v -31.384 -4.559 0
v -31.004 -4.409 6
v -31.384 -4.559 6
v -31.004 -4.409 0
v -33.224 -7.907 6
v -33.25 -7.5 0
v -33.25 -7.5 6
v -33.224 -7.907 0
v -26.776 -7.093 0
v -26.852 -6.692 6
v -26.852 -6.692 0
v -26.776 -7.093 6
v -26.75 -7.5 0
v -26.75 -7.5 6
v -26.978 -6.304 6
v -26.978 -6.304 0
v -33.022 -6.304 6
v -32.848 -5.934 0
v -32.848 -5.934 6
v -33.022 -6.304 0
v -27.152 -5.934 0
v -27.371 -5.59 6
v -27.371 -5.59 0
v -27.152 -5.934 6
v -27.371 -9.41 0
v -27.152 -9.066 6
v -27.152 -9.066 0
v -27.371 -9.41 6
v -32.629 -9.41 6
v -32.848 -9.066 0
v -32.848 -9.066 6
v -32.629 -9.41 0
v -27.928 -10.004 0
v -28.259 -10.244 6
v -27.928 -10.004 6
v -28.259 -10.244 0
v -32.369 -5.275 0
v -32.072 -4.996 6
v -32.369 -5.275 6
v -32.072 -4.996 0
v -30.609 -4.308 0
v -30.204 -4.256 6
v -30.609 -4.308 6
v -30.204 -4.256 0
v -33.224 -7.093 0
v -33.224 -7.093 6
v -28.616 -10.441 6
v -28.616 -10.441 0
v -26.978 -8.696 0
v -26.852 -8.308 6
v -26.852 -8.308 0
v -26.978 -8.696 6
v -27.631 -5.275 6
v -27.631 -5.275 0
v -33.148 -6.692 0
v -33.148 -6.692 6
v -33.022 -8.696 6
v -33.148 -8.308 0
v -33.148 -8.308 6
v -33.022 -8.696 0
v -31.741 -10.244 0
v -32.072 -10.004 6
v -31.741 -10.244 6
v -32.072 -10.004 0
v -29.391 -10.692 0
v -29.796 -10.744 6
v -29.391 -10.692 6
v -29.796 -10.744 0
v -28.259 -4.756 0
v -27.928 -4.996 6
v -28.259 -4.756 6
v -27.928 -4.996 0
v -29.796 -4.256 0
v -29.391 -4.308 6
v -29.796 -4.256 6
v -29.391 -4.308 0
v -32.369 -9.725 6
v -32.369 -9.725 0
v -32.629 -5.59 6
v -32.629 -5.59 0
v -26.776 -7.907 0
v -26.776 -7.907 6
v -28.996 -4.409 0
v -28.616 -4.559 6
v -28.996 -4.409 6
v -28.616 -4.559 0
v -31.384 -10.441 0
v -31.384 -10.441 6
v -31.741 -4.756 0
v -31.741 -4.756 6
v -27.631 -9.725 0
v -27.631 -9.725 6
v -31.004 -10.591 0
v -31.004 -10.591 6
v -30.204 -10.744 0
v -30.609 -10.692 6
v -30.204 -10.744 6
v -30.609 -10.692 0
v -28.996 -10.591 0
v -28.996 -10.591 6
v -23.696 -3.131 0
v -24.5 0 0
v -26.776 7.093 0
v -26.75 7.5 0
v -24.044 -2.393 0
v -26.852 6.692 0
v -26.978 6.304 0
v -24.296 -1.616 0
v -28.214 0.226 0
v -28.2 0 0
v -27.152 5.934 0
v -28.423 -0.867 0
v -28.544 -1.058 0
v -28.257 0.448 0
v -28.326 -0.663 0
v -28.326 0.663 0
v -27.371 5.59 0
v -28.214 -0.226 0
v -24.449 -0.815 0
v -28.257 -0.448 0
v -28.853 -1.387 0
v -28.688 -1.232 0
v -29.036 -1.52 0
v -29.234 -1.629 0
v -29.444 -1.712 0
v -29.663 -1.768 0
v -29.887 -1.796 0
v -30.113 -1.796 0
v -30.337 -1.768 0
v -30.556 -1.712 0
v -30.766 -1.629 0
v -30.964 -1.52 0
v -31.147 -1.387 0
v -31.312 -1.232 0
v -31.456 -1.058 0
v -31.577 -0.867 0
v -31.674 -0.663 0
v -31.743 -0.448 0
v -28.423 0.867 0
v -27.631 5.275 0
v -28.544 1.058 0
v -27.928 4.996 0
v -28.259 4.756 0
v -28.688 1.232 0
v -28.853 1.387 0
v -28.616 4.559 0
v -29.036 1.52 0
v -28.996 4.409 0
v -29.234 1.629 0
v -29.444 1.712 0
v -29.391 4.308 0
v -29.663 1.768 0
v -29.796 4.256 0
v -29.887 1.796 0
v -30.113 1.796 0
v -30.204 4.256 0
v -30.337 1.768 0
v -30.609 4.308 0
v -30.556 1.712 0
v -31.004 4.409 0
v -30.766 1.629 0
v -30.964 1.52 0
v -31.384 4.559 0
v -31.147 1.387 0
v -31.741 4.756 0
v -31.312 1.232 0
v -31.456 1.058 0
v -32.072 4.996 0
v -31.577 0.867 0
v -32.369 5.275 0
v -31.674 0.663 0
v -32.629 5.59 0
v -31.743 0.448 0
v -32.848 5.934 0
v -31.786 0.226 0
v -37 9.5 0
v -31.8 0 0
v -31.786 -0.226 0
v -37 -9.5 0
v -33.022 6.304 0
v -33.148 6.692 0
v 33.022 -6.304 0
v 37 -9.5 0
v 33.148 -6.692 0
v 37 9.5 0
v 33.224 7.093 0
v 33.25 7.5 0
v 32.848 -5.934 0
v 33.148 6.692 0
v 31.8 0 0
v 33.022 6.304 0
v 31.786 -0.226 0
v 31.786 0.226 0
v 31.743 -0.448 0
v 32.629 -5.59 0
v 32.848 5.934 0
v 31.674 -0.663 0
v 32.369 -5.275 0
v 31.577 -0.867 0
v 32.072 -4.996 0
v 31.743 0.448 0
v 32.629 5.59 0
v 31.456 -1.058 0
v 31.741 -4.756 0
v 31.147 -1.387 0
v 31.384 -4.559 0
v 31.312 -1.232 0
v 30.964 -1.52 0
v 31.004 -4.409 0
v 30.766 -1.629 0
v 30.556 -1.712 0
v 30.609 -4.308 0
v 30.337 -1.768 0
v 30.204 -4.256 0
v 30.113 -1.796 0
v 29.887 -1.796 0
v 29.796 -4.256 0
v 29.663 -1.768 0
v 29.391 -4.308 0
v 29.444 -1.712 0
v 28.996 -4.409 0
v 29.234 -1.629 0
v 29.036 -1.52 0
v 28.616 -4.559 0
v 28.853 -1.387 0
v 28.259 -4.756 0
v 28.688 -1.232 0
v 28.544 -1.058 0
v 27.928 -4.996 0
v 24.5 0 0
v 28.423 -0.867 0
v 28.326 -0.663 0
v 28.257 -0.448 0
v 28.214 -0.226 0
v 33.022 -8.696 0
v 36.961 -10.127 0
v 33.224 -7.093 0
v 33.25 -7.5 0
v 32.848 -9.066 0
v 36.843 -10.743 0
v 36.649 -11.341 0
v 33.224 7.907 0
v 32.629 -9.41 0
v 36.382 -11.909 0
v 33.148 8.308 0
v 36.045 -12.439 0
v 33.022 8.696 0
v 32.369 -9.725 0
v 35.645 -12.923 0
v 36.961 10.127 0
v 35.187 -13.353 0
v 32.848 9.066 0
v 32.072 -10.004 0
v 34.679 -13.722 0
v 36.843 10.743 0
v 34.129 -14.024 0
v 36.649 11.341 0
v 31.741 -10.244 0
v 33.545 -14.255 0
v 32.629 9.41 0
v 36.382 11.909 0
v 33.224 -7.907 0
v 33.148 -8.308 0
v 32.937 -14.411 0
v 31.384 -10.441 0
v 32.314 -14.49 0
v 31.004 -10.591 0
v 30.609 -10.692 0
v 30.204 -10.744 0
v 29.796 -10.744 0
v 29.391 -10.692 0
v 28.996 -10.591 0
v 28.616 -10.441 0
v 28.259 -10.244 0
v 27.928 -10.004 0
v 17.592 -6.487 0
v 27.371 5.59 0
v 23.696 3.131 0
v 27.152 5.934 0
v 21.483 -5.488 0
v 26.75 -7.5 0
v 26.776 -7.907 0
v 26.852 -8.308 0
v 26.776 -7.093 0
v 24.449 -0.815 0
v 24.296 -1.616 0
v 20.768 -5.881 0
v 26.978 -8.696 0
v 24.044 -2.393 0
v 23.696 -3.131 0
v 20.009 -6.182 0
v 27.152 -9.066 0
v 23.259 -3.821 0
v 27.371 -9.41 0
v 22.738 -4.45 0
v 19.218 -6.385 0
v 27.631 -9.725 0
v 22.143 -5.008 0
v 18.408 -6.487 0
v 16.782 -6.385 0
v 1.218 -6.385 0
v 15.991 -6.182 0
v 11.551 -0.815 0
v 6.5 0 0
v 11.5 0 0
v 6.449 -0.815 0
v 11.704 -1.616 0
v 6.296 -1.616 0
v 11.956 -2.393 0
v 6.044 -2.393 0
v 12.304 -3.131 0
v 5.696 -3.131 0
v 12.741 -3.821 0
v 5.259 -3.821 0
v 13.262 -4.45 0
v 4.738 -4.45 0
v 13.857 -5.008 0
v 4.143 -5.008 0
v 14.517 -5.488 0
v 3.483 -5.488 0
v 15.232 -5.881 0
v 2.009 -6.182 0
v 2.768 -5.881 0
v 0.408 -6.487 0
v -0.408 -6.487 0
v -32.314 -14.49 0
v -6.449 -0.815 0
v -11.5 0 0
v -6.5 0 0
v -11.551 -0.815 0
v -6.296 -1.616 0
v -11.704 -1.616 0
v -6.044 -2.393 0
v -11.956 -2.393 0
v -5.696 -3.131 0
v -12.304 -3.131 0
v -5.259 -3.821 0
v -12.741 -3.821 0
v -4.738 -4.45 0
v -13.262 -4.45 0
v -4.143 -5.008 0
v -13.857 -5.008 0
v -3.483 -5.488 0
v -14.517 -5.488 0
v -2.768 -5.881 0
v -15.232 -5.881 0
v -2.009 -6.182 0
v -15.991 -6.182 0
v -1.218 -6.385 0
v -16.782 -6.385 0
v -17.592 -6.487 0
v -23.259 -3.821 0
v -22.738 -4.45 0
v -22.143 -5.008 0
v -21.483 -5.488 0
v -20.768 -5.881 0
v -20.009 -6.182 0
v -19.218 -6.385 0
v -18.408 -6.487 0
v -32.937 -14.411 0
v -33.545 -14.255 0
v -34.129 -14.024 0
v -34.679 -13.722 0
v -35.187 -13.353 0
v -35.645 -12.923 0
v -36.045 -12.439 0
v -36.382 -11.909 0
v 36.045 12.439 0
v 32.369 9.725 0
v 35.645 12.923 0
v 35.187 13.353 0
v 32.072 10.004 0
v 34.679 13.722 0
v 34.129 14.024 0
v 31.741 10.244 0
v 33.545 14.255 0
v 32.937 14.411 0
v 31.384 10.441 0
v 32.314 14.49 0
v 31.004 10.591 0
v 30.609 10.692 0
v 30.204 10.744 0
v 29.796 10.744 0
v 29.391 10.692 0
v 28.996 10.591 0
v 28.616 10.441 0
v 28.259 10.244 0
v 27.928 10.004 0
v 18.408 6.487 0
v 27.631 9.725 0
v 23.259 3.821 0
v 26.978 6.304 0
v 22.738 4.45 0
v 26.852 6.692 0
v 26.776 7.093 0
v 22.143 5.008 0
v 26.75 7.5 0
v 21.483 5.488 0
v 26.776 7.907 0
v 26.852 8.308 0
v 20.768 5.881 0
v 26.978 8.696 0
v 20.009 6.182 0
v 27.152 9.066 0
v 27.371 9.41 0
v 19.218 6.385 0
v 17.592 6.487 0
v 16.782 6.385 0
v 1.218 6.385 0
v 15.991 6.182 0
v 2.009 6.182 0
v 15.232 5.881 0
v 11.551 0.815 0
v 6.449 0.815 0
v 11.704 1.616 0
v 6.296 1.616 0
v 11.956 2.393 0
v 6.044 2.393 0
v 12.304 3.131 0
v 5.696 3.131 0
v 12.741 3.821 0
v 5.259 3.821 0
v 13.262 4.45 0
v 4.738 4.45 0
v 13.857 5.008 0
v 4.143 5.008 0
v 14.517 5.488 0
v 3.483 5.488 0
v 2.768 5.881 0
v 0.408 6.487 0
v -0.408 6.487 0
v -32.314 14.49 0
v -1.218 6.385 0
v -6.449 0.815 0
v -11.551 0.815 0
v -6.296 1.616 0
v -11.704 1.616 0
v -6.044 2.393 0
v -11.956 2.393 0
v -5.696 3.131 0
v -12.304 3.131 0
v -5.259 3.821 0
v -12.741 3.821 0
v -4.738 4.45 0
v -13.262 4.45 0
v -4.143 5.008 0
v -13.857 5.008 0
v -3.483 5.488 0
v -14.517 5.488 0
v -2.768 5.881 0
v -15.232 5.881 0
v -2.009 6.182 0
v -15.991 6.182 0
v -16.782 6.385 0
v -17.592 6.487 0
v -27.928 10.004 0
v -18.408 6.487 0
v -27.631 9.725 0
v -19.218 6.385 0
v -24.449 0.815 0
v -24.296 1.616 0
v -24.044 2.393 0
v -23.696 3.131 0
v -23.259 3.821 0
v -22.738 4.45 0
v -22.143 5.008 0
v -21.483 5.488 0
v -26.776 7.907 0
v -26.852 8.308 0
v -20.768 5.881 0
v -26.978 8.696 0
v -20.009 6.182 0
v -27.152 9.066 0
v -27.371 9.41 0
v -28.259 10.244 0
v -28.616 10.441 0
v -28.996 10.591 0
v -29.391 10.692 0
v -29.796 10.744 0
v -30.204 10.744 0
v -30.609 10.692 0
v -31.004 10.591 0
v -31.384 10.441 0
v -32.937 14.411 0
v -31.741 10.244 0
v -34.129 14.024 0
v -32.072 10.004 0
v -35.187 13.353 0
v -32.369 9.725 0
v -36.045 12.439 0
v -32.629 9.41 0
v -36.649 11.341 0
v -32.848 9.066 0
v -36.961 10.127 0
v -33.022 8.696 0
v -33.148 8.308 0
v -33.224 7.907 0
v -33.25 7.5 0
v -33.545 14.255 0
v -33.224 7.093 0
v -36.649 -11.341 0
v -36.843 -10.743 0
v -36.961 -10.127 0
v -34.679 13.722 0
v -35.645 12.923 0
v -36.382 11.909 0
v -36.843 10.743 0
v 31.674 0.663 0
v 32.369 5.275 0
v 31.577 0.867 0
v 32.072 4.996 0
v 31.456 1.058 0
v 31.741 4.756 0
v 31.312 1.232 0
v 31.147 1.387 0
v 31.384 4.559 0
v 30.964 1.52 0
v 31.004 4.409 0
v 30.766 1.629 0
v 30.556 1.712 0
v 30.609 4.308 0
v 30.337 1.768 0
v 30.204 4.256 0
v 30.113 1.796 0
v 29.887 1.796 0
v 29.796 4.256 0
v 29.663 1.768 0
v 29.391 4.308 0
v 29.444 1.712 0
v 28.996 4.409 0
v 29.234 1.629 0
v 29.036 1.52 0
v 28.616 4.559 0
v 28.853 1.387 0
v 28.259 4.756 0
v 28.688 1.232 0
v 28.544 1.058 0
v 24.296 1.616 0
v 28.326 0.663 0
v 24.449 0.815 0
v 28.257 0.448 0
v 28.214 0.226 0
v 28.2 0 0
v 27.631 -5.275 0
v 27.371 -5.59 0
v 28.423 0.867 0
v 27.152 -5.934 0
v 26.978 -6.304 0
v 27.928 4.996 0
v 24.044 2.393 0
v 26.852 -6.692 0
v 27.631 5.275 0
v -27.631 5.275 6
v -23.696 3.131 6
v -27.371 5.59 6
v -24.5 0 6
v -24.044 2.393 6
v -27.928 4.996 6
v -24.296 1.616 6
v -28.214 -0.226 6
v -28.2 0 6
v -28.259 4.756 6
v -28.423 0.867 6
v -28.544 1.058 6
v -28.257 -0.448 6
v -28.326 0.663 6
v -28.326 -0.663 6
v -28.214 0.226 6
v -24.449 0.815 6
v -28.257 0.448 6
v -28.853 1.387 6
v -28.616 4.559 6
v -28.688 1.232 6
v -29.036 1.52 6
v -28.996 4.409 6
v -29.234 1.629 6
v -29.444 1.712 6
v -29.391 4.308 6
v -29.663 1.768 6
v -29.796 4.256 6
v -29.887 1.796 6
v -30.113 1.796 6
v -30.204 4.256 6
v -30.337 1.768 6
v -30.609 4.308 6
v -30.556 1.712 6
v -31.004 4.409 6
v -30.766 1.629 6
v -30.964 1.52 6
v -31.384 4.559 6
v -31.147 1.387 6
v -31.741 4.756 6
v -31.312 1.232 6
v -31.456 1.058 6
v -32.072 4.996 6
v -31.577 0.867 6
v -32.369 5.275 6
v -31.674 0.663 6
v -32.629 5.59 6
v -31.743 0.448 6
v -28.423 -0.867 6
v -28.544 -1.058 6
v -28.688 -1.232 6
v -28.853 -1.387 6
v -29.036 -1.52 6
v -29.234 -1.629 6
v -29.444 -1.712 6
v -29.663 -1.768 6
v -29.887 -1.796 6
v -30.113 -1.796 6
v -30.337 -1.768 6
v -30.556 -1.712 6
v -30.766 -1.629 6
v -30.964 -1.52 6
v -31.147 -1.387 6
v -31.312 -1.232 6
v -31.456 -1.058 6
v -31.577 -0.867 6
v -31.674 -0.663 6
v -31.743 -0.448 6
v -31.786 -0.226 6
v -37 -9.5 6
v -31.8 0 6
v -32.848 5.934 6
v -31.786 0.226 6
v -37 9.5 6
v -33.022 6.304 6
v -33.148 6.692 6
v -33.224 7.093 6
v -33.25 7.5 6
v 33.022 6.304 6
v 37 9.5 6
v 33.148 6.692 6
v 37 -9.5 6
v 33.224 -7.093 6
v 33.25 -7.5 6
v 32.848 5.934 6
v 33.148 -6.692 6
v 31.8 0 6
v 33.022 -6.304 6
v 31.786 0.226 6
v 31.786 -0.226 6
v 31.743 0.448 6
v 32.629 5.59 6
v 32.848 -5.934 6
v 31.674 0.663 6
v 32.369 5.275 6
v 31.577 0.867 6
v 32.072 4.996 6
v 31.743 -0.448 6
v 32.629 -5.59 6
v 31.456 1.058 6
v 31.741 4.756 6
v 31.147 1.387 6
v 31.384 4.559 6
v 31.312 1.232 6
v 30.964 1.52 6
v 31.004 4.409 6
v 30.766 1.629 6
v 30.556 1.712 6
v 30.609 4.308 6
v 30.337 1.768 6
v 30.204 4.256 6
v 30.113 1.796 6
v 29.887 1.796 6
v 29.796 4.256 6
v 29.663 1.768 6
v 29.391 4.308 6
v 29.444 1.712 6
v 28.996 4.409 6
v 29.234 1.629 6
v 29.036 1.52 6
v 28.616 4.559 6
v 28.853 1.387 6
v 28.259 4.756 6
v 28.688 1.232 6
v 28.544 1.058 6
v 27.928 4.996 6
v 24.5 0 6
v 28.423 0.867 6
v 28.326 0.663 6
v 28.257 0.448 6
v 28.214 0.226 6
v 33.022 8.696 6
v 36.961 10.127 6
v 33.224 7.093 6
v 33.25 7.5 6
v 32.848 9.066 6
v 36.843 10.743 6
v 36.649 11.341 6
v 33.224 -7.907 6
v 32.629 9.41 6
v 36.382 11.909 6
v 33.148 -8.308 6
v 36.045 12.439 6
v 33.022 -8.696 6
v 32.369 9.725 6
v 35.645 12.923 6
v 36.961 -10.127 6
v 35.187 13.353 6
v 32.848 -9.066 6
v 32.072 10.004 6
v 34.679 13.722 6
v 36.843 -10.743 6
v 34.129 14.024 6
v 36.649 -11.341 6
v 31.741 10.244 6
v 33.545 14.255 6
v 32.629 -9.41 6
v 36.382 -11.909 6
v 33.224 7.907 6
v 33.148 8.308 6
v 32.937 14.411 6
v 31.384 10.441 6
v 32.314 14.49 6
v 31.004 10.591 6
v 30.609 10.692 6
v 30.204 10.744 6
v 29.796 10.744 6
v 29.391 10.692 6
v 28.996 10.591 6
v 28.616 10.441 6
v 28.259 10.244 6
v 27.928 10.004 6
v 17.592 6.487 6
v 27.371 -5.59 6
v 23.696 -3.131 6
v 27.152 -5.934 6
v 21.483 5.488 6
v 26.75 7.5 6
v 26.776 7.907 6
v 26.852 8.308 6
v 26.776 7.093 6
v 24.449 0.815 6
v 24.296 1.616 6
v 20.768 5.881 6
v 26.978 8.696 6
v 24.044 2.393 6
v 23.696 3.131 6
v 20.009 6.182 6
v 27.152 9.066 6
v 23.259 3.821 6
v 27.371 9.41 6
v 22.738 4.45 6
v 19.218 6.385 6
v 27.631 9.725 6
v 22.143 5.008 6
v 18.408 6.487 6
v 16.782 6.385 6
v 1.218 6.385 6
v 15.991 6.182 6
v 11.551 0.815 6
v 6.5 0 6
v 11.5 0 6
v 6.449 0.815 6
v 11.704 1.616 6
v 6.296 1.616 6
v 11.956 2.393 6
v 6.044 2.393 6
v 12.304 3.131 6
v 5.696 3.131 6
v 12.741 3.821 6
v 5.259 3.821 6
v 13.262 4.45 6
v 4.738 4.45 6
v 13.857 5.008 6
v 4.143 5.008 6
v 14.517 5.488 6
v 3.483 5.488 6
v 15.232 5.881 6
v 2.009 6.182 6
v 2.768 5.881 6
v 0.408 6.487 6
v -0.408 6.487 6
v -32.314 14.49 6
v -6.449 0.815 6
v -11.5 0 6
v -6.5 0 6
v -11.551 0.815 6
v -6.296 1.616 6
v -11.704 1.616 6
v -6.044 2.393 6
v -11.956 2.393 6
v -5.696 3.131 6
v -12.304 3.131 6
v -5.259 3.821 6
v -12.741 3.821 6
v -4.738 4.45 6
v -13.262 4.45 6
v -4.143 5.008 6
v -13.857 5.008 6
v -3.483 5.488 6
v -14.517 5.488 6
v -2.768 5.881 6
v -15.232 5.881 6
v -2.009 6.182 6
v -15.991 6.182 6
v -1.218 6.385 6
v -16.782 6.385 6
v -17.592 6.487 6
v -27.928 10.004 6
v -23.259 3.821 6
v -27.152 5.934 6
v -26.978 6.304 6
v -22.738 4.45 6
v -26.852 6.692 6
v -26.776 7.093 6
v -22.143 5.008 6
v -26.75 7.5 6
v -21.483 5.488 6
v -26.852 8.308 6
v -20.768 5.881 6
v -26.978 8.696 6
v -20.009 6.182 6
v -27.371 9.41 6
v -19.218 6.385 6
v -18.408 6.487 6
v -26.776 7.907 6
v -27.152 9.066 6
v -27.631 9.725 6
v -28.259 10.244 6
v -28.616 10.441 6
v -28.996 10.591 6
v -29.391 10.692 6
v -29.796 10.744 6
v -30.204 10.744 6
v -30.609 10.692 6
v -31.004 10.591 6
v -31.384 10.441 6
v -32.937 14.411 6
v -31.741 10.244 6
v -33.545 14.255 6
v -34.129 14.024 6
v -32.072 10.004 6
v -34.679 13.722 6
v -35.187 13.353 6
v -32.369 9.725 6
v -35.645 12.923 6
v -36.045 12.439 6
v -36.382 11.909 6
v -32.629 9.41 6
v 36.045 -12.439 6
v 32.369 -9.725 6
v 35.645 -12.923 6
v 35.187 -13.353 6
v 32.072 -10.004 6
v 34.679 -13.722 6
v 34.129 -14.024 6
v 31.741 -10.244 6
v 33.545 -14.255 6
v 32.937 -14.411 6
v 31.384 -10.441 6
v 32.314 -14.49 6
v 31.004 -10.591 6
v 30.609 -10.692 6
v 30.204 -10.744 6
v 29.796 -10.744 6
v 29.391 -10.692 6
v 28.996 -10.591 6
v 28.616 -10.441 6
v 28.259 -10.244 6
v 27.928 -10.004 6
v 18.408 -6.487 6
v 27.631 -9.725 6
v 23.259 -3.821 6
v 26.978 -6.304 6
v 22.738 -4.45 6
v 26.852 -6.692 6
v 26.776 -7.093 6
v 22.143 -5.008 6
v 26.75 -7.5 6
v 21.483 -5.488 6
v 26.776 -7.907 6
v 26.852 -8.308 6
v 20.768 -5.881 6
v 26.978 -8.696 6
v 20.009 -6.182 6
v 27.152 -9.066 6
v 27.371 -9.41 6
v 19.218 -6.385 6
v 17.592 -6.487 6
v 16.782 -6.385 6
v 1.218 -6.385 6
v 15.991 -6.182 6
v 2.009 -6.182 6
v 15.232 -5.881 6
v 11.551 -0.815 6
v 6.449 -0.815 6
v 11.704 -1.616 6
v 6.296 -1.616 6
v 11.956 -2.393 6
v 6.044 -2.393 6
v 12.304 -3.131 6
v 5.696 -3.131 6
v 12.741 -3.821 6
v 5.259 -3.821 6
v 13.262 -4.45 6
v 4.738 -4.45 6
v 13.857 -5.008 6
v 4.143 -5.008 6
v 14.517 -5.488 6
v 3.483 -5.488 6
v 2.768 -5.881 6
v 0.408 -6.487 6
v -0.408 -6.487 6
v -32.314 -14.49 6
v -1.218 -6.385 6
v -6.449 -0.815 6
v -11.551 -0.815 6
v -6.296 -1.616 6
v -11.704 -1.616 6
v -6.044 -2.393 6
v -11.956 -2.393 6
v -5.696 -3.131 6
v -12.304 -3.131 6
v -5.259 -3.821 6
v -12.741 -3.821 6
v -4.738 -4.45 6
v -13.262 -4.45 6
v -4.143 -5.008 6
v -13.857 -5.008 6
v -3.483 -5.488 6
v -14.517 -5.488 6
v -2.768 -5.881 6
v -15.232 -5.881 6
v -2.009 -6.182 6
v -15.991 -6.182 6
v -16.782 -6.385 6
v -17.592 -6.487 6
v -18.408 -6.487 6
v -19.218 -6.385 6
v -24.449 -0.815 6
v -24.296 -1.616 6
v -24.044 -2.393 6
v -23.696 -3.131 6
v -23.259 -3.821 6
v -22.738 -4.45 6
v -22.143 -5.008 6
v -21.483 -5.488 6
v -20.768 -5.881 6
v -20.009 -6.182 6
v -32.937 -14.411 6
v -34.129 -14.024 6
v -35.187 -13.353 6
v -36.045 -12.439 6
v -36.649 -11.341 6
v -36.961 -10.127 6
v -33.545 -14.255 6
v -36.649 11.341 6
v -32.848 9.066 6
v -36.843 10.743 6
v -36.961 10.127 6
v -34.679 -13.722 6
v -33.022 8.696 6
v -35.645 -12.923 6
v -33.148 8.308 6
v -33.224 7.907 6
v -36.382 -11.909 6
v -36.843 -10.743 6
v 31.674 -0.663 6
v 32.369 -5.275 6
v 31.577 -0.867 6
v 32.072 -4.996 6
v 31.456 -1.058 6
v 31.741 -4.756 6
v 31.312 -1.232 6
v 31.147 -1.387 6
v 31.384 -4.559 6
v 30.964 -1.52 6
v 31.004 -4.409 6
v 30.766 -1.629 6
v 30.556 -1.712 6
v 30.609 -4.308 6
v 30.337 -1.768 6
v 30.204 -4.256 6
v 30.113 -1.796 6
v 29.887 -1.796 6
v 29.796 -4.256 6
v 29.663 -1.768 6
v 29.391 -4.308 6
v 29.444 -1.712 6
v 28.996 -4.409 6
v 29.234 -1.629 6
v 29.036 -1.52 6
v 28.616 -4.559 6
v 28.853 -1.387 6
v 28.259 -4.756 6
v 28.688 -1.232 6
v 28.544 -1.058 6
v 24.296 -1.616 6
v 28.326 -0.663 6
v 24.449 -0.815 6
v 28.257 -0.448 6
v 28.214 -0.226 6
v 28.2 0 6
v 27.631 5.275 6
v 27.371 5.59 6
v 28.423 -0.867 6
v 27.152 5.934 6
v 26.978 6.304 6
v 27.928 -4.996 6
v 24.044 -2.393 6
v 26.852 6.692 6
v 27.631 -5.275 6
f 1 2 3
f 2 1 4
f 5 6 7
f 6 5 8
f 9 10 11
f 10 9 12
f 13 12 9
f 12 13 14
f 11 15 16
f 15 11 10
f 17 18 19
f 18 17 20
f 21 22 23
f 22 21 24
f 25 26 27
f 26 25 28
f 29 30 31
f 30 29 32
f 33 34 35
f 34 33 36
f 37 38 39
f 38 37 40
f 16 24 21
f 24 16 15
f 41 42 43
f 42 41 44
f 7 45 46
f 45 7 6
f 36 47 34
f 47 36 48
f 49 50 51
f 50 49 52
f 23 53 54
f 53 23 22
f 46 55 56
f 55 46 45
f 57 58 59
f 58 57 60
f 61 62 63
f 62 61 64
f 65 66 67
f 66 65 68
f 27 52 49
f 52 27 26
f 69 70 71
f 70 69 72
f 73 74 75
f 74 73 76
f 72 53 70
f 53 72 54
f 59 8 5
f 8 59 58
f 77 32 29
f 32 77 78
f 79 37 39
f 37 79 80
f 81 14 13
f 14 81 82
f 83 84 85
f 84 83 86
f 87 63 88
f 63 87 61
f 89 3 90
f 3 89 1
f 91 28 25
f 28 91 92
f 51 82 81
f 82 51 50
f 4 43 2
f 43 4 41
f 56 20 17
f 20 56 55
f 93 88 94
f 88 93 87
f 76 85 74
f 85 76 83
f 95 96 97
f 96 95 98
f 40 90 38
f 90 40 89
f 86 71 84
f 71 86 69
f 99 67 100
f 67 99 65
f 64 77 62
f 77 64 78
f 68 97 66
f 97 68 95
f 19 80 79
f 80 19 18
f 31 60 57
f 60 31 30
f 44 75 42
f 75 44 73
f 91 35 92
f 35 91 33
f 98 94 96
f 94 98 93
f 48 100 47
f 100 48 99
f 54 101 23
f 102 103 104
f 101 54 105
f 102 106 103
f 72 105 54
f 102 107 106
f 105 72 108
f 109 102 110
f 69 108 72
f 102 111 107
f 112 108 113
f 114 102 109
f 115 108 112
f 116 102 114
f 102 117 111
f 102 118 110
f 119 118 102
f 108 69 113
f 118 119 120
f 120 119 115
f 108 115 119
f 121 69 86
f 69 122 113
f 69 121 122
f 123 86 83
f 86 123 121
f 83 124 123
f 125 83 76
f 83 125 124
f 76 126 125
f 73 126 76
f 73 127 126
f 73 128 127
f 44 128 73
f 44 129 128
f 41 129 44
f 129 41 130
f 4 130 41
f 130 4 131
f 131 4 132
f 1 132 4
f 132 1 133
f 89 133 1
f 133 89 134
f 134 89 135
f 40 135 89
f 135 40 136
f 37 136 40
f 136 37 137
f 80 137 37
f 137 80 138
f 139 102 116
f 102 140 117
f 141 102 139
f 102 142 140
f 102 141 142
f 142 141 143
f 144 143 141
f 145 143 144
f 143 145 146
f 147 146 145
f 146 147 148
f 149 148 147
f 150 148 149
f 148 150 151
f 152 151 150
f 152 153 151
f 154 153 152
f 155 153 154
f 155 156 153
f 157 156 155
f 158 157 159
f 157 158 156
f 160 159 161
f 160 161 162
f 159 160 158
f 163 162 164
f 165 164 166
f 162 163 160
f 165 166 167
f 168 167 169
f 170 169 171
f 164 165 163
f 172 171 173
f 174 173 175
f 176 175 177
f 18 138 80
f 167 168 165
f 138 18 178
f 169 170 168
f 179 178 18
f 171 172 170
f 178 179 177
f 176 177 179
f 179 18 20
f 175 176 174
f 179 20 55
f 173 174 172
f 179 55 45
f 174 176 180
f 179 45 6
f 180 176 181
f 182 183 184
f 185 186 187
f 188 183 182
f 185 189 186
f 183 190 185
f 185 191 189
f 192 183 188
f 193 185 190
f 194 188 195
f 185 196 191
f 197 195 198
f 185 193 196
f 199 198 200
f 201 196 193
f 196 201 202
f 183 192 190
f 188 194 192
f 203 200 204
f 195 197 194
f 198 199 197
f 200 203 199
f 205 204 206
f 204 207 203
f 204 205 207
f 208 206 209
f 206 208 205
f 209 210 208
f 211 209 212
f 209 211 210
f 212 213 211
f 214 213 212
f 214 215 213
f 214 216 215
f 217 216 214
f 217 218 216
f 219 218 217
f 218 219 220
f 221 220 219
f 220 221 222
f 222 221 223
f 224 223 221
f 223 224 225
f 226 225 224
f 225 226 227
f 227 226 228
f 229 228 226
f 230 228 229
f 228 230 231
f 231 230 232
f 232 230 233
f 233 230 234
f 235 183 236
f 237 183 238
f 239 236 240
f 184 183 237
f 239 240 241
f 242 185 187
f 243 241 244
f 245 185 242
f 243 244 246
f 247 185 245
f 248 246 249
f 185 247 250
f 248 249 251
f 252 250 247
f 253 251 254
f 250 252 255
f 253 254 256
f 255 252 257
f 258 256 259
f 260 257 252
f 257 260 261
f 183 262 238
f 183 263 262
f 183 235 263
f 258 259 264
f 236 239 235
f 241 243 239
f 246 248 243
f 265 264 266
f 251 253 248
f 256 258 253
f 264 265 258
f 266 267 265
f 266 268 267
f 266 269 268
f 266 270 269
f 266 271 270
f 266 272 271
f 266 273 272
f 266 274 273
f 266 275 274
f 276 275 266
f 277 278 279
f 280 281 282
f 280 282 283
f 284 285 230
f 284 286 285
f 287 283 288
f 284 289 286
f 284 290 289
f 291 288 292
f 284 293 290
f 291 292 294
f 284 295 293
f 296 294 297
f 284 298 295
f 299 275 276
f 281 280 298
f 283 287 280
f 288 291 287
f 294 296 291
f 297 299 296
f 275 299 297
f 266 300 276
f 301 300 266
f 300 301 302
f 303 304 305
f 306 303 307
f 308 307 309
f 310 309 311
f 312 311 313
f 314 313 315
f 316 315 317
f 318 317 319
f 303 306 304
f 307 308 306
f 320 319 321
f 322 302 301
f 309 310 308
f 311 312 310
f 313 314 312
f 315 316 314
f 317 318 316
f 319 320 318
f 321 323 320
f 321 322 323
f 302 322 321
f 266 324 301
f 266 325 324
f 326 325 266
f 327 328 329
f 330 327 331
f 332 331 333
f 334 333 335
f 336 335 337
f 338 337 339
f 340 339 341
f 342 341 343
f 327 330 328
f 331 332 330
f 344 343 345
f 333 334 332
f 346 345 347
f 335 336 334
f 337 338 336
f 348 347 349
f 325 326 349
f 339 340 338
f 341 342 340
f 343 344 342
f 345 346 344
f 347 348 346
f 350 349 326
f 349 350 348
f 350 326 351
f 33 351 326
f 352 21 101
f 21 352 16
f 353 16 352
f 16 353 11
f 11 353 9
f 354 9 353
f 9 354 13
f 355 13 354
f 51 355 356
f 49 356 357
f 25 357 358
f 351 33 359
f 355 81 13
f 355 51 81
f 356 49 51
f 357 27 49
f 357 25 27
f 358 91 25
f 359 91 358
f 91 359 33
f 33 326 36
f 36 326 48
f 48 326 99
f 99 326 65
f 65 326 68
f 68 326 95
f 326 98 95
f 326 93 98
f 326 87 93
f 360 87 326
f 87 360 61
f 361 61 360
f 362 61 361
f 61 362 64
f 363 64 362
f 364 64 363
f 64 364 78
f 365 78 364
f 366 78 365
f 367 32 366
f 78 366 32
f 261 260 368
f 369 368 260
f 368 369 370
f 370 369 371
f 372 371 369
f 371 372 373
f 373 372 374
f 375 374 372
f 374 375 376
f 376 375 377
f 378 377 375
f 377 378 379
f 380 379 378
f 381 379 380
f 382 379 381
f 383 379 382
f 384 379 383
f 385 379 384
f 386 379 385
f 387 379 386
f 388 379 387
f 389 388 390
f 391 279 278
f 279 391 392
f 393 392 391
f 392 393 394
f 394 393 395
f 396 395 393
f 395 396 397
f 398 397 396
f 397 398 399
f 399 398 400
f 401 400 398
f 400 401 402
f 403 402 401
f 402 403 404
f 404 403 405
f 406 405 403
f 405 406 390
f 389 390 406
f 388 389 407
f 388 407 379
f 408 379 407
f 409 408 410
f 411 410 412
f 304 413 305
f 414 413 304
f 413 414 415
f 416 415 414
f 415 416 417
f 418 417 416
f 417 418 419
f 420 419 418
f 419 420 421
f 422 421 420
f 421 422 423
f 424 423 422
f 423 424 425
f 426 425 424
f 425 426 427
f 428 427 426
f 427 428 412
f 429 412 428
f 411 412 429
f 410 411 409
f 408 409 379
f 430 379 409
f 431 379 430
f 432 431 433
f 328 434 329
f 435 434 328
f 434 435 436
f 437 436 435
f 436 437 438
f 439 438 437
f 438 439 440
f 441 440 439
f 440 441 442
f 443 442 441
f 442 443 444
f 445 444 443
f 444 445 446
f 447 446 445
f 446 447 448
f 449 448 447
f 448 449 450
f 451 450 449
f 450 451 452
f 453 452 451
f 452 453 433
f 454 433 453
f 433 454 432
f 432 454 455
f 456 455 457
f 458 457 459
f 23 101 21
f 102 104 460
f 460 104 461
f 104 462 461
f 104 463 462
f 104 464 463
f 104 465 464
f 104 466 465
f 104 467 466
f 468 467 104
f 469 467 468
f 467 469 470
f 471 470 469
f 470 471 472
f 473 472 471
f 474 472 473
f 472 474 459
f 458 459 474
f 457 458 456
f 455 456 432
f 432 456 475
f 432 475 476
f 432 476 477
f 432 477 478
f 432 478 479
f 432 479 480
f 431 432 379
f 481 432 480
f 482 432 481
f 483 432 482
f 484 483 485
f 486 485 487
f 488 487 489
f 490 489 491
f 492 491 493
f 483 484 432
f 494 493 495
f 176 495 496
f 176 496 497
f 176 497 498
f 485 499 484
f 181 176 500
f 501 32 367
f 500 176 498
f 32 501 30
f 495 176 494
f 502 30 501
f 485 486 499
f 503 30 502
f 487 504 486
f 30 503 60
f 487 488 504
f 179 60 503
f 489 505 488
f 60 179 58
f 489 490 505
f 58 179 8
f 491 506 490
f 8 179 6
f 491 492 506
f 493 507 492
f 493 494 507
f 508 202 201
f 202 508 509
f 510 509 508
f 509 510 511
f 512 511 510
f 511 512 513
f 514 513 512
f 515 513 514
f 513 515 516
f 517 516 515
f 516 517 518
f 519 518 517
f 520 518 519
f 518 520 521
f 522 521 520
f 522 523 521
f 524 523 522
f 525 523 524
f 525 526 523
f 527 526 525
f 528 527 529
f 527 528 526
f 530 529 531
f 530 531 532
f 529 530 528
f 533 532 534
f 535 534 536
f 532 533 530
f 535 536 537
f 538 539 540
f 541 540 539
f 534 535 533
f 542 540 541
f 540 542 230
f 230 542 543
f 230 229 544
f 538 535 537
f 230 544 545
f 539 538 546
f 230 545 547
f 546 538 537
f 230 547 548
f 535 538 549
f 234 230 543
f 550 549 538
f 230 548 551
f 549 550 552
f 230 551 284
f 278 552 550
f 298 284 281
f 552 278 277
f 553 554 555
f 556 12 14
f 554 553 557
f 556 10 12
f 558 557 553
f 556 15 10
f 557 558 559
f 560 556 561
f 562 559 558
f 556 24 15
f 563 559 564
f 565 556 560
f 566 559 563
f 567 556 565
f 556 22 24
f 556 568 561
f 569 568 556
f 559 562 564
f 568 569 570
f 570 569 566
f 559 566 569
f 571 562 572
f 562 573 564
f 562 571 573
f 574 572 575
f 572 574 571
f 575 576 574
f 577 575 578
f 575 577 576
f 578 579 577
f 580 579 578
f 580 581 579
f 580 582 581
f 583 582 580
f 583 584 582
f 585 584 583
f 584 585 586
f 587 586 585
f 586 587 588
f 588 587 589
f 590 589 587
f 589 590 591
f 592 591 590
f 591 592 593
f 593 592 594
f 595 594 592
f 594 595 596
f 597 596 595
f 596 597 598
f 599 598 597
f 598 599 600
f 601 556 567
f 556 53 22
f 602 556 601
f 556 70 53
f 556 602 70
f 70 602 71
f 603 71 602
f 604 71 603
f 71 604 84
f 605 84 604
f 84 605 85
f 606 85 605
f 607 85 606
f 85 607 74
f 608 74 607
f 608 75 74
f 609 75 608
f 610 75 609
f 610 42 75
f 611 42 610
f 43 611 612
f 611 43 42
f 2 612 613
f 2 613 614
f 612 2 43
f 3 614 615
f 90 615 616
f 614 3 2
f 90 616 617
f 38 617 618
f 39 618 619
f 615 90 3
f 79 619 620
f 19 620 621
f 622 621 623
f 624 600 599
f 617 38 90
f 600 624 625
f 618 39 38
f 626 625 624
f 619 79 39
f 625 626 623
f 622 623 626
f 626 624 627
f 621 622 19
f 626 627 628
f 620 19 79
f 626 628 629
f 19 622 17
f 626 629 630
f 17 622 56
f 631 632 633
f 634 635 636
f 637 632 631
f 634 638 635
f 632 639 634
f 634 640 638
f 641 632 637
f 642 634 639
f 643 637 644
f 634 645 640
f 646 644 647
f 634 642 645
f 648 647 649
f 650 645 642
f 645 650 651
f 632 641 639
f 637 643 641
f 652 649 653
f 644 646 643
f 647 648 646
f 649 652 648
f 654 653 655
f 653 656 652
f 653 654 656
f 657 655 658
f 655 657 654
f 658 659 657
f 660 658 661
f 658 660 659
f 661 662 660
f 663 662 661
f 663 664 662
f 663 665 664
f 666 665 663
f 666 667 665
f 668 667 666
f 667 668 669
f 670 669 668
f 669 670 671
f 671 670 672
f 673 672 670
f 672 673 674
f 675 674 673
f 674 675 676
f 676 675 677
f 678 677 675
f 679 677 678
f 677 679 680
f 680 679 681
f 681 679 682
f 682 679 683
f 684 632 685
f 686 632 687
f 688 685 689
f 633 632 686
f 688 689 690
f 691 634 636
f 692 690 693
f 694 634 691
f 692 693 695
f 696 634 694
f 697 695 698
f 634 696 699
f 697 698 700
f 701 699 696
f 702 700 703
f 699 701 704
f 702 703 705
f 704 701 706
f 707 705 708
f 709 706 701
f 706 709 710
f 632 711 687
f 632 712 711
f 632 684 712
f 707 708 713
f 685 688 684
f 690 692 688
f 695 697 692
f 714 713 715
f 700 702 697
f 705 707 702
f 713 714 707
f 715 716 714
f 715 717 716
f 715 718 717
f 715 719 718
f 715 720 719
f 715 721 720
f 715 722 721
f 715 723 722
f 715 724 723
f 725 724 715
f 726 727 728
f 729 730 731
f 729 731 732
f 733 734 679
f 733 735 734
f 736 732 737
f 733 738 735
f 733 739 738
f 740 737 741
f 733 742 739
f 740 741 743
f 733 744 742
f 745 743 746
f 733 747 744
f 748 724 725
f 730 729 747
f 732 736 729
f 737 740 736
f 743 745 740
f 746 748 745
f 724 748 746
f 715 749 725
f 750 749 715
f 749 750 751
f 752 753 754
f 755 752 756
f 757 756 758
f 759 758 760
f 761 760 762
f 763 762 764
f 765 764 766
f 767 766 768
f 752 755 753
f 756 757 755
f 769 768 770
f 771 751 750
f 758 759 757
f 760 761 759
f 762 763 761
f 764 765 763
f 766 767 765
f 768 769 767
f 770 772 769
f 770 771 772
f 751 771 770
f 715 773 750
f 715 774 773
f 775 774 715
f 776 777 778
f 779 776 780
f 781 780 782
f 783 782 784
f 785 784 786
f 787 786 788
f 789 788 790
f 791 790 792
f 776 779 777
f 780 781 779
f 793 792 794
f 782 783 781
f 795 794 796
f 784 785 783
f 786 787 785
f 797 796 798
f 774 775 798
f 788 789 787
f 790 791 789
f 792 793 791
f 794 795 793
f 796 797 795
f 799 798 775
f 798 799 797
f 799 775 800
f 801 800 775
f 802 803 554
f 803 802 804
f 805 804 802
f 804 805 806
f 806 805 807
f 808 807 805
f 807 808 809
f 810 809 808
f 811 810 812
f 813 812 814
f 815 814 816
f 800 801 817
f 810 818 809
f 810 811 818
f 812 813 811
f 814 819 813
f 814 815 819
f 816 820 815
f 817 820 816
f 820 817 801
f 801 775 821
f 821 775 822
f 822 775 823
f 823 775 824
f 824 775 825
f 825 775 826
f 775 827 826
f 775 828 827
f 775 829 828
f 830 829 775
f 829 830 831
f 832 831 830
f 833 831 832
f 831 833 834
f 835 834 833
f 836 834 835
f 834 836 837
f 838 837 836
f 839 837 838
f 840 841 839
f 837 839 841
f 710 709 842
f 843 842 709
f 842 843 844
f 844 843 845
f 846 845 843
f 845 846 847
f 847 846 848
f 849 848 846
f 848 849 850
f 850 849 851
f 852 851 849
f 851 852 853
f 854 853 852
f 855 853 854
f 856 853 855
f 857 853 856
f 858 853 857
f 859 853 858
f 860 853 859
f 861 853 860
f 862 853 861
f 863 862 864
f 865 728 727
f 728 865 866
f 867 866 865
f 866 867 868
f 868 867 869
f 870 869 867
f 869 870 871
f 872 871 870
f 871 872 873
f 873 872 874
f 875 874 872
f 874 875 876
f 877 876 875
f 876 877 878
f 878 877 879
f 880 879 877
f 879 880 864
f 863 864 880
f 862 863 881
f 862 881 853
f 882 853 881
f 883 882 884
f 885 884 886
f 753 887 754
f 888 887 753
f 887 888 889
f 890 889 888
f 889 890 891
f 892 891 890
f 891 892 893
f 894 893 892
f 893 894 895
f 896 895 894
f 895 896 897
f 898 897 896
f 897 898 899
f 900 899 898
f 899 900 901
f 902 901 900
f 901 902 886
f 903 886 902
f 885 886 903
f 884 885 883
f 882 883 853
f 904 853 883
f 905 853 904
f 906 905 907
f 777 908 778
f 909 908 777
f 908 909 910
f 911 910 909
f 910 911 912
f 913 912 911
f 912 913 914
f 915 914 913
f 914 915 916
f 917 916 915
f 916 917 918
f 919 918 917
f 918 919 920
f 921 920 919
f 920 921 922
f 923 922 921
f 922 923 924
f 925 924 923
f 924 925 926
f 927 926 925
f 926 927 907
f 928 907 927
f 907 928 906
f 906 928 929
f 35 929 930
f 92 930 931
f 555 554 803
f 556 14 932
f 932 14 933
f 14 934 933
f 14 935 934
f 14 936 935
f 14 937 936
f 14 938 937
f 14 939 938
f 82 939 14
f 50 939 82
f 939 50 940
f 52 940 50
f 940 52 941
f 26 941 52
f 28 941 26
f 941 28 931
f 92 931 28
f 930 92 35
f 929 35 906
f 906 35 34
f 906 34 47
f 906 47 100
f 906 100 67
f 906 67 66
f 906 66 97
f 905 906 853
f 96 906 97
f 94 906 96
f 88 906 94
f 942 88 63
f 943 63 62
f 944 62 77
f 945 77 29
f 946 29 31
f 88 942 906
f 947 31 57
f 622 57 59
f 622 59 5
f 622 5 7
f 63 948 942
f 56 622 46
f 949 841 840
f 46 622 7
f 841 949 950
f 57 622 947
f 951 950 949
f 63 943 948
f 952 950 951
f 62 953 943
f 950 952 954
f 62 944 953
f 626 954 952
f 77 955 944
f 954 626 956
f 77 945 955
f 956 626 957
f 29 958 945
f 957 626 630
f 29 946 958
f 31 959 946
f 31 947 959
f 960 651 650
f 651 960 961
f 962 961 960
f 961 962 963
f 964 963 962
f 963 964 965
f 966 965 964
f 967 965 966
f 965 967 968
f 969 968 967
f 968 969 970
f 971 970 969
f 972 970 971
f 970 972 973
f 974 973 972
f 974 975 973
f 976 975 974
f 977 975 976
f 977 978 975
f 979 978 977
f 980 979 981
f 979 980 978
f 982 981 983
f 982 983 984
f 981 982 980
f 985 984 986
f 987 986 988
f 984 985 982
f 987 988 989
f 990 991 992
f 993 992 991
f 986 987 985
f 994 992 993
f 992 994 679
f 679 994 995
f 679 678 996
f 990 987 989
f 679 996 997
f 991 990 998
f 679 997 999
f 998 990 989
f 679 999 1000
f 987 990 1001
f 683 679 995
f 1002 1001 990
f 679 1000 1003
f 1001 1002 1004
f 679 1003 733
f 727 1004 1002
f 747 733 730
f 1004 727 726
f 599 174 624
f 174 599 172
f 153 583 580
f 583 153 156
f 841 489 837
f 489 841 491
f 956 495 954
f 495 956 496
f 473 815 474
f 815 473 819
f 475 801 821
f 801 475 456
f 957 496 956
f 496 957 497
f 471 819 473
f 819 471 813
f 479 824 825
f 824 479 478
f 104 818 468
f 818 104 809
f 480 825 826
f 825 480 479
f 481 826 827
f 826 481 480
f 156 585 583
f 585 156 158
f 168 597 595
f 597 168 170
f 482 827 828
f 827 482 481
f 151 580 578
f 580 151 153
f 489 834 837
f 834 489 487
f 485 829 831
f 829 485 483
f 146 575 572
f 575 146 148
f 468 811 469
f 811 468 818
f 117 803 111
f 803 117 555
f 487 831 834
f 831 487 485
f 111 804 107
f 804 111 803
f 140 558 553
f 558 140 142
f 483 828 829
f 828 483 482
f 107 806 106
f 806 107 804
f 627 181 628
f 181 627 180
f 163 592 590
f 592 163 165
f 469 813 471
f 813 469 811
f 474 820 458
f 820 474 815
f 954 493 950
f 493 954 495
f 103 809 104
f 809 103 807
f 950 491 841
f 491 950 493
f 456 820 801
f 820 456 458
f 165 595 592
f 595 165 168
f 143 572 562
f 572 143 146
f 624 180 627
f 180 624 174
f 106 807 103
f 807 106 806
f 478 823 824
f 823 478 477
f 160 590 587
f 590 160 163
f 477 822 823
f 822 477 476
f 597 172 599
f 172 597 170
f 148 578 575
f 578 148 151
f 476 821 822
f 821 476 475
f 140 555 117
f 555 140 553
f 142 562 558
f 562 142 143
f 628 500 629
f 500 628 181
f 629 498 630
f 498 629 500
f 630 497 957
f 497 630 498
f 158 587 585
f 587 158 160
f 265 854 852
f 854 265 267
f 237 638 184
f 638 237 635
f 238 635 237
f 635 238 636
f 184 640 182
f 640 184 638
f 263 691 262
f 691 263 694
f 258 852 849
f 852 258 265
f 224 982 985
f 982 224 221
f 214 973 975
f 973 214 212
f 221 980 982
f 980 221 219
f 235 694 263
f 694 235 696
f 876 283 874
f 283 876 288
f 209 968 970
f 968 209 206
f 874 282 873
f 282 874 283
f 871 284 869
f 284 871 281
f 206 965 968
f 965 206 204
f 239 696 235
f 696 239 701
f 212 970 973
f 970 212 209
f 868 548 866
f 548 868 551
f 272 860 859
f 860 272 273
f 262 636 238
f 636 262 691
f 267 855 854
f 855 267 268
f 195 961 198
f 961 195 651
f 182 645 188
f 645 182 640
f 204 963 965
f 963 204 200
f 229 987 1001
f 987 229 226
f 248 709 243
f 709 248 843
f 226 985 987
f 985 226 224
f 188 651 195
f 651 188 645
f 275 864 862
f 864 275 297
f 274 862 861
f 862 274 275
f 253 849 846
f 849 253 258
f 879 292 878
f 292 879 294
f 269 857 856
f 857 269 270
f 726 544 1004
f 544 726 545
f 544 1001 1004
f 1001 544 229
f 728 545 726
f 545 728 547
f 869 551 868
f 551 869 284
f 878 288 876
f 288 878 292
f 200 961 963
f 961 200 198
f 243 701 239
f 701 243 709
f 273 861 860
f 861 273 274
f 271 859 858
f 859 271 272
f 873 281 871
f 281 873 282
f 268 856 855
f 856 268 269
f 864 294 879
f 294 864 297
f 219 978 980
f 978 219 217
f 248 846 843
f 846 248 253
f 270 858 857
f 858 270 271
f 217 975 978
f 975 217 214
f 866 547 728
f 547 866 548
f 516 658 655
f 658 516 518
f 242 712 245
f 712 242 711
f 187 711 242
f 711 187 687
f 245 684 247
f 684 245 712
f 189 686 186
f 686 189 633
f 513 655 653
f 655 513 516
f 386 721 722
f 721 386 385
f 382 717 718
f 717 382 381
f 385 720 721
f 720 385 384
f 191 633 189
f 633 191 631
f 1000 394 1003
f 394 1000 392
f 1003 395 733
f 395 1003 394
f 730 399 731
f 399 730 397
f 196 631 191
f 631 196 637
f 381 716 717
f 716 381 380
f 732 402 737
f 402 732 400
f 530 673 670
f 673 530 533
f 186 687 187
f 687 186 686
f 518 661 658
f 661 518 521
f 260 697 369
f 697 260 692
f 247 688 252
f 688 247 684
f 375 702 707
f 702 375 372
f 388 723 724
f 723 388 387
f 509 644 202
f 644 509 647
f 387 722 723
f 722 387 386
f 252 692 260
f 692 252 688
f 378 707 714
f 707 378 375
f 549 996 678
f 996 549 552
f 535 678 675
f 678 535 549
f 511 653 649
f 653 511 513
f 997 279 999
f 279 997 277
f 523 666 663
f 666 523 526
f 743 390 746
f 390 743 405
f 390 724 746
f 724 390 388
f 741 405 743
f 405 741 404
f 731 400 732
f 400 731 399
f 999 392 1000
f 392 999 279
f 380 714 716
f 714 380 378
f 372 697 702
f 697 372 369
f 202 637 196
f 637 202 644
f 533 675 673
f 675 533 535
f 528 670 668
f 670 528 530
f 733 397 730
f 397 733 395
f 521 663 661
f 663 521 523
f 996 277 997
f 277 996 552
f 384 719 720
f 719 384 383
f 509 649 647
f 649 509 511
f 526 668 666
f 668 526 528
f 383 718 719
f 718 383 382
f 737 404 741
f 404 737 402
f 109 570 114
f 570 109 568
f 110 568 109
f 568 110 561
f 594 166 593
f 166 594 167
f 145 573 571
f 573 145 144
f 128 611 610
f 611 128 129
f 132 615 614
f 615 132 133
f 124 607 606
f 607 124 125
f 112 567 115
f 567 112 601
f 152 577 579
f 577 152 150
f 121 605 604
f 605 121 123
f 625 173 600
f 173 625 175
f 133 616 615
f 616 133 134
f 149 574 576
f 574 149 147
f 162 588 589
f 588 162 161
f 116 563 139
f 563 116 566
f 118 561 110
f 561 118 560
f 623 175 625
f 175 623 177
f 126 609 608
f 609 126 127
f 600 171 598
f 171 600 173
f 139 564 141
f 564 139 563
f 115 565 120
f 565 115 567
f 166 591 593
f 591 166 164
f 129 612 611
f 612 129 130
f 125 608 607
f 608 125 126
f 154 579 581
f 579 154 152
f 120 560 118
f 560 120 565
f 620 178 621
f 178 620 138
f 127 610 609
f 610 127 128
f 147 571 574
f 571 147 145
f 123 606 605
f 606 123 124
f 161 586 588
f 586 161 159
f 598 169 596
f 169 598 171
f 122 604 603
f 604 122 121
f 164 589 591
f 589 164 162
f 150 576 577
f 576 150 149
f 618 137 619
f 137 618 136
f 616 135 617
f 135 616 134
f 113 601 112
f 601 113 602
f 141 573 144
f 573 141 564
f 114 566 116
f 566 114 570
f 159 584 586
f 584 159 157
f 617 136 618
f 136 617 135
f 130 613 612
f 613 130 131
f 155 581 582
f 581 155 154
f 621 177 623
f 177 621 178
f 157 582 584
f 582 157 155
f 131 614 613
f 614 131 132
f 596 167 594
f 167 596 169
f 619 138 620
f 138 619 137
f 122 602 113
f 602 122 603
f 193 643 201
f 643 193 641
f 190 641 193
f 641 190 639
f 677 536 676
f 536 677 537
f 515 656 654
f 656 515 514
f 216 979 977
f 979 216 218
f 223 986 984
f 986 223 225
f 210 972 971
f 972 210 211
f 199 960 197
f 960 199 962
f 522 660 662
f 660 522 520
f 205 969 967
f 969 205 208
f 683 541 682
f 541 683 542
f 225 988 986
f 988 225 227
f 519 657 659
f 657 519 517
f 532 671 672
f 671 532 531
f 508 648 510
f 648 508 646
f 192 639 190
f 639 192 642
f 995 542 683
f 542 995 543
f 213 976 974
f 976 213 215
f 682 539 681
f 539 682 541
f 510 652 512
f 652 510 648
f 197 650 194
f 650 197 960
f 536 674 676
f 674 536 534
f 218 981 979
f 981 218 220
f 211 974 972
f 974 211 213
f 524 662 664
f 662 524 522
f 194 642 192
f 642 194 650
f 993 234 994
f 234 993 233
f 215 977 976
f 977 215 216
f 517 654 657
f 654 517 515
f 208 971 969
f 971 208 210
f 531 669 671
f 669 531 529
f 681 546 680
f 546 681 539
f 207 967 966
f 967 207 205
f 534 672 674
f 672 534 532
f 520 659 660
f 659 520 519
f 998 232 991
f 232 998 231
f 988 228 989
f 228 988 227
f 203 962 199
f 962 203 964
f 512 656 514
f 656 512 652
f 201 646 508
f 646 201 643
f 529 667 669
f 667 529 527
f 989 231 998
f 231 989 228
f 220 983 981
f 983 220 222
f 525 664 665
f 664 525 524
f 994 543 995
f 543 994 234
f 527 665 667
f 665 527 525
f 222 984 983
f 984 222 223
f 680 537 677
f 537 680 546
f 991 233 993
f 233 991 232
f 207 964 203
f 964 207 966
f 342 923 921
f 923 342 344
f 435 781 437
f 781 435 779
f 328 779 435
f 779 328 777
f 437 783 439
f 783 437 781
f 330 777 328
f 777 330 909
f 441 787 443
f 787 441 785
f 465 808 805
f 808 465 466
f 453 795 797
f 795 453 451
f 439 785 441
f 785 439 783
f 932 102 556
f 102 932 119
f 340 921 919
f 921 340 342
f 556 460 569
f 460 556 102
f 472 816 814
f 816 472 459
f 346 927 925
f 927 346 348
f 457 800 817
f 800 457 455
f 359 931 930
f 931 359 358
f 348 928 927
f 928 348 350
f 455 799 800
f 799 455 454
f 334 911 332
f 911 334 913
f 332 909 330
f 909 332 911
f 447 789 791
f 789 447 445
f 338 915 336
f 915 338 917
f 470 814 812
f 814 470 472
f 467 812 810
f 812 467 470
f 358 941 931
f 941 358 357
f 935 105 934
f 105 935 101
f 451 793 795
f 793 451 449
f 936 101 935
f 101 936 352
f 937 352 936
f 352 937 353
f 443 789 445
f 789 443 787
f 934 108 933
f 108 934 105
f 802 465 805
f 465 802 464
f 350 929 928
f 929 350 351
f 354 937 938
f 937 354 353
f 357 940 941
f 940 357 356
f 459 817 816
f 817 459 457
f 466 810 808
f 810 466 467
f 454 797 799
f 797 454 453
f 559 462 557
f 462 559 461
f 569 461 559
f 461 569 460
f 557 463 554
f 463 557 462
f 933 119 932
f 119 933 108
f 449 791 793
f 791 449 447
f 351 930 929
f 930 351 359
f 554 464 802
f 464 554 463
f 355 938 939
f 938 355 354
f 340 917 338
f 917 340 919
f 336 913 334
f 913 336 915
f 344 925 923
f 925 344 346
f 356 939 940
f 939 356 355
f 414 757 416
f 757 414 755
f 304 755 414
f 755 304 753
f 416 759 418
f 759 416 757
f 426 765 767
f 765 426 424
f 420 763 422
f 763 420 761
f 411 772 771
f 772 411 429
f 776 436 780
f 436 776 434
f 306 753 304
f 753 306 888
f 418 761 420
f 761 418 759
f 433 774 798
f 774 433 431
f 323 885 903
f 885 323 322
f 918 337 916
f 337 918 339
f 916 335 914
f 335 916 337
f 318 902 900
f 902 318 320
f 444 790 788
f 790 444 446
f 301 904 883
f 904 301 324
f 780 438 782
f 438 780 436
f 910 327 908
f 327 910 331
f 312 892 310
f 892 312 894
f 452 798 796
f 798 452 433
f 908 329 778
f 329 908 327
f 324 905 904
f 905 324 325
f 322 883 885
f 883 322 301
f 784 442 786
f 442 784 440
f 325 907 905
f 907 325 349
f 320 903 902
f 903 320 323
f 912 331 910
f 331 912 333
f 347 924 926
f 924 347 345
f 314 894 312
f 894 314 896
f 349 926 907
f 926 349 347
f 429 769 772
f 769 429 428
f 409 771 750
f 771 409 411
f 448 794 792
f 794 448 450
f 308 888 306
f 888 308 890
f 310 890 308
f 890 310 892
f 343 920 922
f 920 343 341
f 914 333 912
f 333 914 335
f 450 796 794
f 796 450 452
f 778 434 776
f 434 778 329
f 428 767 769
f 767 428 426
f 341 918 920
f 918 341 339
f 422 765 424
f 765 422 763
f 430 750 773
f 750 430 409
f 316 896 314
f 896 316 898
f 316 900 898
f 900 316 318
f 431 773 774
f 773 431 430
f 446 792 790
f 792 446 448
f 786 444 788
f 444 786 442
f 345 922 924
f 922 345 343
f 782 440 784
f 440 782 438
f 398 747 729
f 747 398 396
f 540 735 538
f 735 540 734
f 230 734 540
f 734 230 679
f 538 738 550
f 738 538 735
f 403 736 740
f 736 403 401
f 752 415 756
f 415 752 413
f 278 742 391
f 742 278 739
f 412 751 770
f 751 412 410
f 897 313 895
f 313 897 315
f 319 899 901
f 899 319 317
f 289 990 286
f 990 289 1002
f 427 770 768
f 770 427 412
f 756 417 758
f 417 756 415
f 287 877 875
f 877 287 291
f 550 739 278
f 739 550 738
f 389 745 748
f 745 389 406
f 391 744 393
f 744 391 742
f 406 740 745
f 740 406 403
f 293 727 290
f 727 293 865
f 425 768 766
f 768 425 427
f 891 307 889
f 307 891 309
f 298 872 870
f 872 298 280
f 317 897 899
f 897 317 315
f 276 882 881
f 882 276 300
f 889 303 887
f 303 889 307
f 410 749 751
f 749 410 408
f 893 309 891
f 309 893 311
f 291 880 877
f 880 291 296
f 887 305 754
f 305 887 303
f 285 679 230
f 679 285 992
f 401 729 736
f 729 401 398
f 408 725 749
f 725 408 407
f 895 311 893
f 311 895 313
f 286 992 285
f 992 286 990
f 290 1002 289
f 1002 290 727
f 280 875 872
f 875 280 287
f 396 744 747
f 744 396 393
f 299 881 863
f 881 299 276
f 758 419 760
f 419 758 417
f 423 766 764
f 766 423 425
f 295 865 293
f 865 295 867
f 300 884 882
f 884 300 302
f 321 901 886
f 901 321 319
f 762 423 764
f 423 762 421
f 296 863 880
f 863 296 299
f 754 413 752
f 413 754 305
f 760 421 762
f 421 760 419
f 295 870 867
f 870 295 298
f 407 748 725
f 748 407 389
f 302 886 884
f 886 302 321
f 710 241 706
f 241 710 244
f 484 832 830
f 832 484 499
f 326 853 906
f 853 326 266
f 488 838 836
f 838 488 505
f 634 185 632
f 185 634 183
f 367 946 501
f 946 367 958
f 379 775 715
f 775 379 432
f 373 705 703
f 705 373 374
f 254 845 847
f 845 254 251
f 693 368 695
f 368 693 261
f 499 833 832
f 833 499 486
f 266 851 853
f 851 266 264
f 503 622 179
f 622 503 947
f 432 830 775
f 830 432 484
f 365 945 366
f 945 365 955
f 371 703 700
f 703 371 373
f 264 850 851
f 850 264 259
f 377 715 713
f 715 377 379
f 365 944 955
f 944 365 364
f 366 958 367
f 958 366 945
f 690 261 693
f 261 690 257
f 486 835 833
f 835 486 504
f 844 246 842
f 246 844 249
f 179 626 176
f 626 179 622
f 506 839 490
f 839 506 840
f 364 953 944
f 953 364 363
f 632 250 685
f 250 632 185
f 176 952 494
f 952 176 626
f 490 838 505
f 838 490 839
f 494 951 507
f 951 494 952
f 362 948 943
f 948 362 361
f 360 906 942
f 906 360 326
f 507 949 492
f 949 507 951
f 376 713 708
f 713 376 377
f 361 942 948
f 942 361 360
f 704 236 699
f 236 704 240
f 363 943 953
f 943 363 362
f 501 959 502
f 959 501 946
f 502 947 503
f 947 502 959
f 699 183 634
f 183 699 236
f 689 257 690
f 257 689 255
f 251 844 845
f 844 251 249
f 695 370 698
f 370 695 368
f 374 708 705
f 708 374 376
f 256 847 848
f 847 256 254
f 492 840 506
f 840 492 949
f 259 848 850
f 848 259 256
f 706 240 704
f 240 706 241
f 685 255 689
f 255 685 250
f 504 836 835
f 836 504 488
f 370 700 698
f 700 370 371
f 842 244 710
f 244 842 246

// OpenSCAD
$fn = 50;

difference() {
	union() {
		hull() {
			translate(v = [-32.0, 9.5, 0]) {
				cylinder(h = 6, r = 5);
			}
			translate(v = [32.0, 9.5, 0]) {
				cylinder(h = 6, r = 5);
			}
			translate(v = [-32.0, -9.5, 0]) {
				cylinder(h = 6, r = 5);
			}
			translate(v = [32.0, -9.5, 0]) {
				cylinder(h = 6, r = 5);
			}
		}
	}
	union() {
		translate(v = [-30.0, -7.5, 0]) {
			cylinder(h = 6, r = 3.25);
		}
		translate(v = [-30.0, 7.5, 0]) {
			cylinder(h = 6, r = 3.25);
		}
		translate(v = [30.0, -7.5, 0]) {
			cylinder(h = 6, r = 3.25);
		}
		translate(v = [30.0, 7.5, 0]) {
			cylinder(h = 6, r = 3.25);
		}
		translate(v = [-30.0, 0.0, 0]) {
			cylinder(h = 6, r = 1.8);
		}
		translate(v = [30.0, 0.0, 0]) {
			cylinder(h = 6, r = 1.8);
		}
		translate(v = [-18.0, 0, 0.0]) {
			cylinder(h = 6, r = 6.5);
		}
		cylinder(h = 6, r = 6.5);
		translate(v = [18.0, 0, 0.0]) {
			cylinder(h = 6, r = 6.5);
		}
	}
}
